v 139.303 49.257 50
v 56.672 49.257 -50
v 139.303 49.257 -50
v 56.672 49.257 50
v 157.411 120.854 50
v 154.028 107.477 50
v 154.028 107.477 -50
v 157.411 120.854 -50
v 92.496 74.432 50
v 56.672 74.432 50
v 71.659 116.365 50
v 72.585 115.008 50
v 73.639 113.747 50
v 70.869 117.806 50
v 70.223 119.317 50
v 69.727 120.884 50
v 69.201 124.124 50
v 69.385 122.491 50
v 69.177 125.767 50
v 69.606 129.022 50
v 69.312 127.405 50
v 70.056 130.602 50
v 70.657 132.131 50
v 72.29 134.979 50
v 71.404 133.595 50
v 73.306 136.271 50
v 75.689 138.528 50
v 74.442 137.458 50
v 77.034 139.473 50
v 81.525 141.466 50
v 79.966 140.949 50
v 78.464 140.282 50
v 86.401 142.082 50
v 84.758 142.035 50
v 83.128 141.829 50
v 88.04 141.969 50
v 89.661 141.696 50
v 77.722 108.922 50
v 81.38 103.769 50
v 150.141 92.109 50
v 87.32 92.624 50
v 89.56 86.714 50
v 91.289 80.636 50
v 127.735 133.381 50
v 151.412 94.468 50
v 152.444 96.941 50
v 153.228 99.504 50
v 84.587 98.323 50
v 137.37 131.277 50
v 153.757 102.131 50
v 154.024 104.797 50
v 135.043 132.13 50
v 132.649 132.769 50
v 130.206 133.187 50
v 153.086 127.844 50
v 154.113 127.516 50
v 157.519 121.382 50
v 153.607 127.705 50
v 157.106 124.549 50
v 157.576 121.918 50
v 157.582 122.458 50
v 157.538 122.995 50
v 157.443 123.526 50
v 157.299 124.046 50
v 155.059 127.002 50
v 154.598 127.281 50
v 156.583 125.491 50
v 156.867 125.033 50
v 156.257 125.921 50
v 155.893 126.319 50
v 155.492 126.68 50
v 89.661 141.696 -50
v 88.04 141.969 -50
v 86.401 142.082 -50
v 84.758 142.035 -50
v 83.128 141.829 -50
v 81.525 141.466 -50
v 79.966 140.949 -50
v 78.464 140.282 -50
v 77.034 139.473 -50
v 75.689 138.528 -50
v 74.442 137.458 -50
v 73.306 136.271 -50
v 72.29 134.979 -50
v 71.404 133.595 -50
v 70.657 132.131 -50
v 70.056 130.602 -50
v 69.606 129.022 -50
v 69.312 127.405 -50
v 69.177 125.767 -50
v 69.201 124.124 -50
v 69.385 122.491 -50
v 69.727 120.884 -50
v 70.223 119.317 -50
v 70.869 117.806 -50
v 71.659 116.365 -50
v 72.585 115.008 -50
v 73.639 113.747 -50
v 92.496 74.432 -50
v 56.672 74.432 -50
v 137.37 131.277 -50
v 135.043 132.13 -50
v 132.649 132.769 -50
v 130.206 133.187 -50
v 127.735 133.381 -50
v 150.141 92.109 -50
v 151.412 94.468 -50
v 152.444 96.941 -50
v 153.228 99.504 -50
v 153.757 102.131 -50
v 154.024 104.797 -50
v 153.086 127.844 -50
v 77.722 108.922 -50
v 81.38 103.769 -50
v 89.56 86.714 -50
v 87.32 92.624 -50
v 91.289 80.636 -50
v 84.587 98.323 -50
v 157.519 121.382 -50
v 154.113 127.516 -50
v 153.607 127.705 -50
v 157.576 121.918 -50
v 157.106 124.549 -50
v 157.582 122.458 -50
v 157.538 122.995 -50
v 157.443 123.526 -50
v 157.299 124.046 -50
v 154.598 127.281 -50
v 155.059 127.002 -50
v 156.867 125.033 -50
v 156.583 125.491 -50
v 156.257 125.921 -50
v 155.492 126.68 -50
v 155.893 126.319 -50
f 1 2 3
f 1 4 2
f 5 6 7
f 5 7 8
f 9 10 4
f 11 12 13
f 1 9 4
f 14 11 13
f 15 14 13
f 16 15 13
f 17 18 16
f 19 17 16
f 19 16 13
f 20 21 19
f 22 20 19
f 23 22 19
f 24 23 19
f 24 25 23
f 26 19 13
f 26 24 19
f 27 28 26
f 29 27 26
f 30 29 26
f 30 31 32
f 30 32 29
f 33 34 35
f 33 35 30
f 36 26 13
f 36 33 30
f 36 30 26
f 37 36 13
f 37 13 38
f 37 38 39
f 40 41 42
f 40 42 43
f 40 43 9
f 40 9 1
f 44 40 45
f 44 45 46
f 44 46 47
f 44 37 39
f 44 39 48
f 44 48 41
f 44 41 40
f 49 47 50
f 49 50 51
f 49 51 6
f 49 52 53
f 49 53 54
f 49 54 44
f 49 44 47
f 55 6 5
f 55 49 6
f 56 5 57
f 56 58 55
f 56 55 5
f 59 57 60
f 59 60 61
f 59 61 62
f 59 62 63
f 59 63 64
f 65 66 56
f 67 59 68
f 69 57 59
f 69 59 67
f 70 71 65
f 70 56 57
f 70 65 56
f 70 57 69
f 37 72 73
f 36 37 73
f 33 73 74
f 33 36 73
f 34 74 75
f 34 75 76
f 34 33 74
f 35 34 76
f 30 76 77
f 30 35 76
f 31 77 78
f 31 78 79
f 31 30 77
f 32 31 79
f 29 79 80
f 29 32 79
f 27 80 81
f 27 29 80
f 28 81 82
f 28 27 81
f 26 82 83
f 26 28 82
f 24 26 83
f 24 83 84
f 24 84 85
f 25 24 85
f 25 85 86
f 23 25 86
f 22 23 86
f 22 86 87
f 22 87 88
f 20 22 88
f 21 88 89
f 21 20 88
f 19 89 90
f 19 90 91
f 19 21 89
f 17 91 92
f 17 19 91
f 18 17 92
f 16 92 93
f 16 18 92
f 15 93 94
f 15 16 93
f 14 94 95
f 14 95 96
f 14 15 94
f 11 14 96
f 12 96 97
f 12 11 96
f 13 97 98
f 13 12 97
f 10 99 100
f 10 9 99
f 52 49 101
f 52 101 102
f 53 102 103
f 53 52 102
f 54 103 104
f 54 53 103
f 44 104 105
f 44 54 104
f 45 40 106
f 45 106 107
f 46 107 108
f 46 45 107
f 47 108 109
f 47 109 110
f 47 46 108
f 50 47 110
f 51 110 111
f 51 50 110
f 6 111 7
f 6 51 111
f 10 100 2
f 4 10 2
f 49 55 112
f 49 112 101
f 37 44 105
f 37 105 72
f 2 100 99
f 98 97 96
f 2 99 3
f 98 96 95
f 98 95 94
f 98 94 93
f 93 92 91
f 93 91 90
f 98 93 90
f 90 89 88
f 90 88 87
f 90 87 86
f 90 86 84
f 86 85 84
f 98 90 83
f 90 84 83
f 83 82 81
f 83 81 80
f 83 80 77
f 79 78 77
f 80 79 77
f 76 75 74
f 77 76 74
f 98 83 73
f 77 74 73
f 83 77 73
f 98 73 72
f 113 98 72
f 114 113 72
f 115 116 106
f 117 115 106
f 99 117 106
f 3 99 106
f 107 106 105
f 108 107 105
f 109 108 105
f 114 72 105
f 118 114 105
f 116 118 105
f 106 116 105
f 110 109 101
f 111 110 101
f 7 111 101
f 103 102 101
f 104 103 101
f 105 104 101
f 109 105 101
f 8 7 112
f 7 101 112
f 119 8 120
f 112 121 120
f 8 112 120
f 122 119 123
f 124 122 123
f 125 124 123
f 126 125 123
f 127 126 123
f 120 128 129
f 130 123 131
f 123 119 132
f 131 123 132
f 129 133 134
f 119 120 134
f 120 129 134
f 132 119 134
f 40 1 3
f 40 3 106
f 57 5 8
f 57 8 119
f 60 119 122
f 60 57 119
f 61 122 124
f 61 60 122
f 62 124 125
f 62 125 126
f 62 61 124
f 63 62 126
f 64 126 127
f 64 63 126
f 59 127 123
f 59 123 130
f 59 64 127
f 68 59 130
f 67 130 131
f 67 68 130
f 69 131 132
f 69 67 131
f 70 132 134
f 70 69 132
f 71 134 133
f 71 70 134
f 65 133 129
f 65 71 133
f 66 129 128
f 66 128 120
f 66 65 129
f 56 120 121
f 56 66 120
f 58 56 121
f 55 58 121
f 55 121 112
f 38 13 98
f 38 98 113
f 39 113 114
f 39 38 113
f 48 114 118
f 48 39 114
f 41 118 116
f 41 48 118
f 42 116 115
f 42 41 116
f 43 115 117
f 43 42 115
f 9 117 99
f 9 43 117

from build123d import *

# Parameters (mm, degrees)
EXTRUDE_1_DEPTH                = 50
SPLIT_BODIES_1_SURFACE_1_BACK  = 235.567
SPLIT_BODIES_1_SURFACE_1_DEPTH = 471.134
SPLIT_BODIES_1_SURFACE_2_BACK  = 235.567
SPLIT_BODIES_1_SURFACE_2_DEPTH = 471.134


with BuildPart() as part:
    # 草图1 → 凸台-拉伸1 (new, symmetric)
    with BuildSketch(Plane.XY):
        with BuildLine():
            Line((56.67204093, 43.504108875), (36.476006197, 29.147891414))
            Line((36.476006197, 29.147891414), (0, 29.147891414))
            Line((0, 29.147891414), (0, 0))
            Line((0, 0), (144.001, 0))
            Line((144.001, 0), (134.529857437, 27.122156161))
            Line((134.529857437, 27.122156161), (117.072161438, 27.122156161))
            Line((117.072161438, 27.122156161), (123.353516134, 49.257428232))
            Line((123.353516134, 49.257428232), (139.303205185, 49.257428232))
            Line((139.303205185, 49.257428232), (150.141177621, 92.108587215))
            ThreePointArc((150.141177621, 92.108587215), (153.228333696, 99.503580273), (154.028196985, 107.477078481))
            Line((154.028196985, 107.477078481), (157.411382406, 120.853511867))
            ThreePointArc((157.411382406, 120.853511867), (156.730372482, 125.265422842), (153.08647989, 127.844333418))
            Line((153.08647989, 127.844333418), (137.369721749, 131.276874543))
            ThreePointArc((137.369721749, 131.276874543), (132.648572458, 132.768940094), (127.735239934, 133.381046075))
            Line((127.735239934, 133.381046075), (89.661, 141.696462857))
            ThreePointArc((89.661, 141.696462857), (71.40391268, 133.595205289), (73.639067543, 113.746888123))
            ThreePointArc((73.639067543, 113.746888123), (86.014043833, 95.502710926), (92.496172884, 74.432066828))
            Line((92.496172884, 74.432066828), (56.67204093, 74.432066828))
            Line((56.67204093, 74.432066828), (56.67204093, 43.504108875))
        make_face()
    extrude(amount=EXTRUDE_1_DEPTH, both=True)


with BuildPart() as body_2:
    # Split Bodies 1: the piece behind the surface
    add(part.part)
    # Split Bodies 1 surface: a surface, the sketch's curves swept straight by 471.134 mm
    with BuildLine(Plane.XY.offset(50).offset(-SPLIT_BODIES_1_SURFACE_1_BACK), mode=Mode.PRIVATE) as split_bodies_1_surface_1_path:
        Line((123.353516134, 49.257428232), (56.67204093, 49.257428232))
    split_bodies_1_surface_1 = Shell.extrude(split_bodies_1_surface_1_path.wire(), (0 * SPLIT_BODIES_1_SURFACE_1_DEPTH, 0 * SPLIT_BODIES_1_SURFACE_1_DEPTH, 1 * SPLIT_BODIES_1_SURFACE_1_DEPTH))
    split(bisect_by=split_bodies_1_surface_1, keep=Keep.BOTTOM)


with BuildPart() as part_1:
    add(part.part)

    # Split Bodies 1: split by a surface, the side it looks to stays
    # Split Bodies 1 surface: a surface, the sketch's curves swept straight by 471.134 mm
    with BuildLine(Plane.XY.offset(50).offset(-SPLIT_BODIES_1_SURFACE_2_BACK), mode=Mode.PRIVATE) as split_bodies_1_surface_2_path:
        Line((123.353516134, 49.257428232), (56.67204093, 49.257428232))
    split_bodies_1_surface_2 = Shell.extrude(split_bodies_1_surface_2_path.wire(), (0 * SPLIT_BODIES_1_SURFACE_2_DEPTH, 0 * SPLIT_BODIES_1_SURFACE_2_DEPTH, 1 * SPLIT_BODIES_1_SURFACE_2_DEPTH))
    split(bisect_by=split_bodies_1_surface_2, keep=Keep.TOP)


solid = body_2.part
